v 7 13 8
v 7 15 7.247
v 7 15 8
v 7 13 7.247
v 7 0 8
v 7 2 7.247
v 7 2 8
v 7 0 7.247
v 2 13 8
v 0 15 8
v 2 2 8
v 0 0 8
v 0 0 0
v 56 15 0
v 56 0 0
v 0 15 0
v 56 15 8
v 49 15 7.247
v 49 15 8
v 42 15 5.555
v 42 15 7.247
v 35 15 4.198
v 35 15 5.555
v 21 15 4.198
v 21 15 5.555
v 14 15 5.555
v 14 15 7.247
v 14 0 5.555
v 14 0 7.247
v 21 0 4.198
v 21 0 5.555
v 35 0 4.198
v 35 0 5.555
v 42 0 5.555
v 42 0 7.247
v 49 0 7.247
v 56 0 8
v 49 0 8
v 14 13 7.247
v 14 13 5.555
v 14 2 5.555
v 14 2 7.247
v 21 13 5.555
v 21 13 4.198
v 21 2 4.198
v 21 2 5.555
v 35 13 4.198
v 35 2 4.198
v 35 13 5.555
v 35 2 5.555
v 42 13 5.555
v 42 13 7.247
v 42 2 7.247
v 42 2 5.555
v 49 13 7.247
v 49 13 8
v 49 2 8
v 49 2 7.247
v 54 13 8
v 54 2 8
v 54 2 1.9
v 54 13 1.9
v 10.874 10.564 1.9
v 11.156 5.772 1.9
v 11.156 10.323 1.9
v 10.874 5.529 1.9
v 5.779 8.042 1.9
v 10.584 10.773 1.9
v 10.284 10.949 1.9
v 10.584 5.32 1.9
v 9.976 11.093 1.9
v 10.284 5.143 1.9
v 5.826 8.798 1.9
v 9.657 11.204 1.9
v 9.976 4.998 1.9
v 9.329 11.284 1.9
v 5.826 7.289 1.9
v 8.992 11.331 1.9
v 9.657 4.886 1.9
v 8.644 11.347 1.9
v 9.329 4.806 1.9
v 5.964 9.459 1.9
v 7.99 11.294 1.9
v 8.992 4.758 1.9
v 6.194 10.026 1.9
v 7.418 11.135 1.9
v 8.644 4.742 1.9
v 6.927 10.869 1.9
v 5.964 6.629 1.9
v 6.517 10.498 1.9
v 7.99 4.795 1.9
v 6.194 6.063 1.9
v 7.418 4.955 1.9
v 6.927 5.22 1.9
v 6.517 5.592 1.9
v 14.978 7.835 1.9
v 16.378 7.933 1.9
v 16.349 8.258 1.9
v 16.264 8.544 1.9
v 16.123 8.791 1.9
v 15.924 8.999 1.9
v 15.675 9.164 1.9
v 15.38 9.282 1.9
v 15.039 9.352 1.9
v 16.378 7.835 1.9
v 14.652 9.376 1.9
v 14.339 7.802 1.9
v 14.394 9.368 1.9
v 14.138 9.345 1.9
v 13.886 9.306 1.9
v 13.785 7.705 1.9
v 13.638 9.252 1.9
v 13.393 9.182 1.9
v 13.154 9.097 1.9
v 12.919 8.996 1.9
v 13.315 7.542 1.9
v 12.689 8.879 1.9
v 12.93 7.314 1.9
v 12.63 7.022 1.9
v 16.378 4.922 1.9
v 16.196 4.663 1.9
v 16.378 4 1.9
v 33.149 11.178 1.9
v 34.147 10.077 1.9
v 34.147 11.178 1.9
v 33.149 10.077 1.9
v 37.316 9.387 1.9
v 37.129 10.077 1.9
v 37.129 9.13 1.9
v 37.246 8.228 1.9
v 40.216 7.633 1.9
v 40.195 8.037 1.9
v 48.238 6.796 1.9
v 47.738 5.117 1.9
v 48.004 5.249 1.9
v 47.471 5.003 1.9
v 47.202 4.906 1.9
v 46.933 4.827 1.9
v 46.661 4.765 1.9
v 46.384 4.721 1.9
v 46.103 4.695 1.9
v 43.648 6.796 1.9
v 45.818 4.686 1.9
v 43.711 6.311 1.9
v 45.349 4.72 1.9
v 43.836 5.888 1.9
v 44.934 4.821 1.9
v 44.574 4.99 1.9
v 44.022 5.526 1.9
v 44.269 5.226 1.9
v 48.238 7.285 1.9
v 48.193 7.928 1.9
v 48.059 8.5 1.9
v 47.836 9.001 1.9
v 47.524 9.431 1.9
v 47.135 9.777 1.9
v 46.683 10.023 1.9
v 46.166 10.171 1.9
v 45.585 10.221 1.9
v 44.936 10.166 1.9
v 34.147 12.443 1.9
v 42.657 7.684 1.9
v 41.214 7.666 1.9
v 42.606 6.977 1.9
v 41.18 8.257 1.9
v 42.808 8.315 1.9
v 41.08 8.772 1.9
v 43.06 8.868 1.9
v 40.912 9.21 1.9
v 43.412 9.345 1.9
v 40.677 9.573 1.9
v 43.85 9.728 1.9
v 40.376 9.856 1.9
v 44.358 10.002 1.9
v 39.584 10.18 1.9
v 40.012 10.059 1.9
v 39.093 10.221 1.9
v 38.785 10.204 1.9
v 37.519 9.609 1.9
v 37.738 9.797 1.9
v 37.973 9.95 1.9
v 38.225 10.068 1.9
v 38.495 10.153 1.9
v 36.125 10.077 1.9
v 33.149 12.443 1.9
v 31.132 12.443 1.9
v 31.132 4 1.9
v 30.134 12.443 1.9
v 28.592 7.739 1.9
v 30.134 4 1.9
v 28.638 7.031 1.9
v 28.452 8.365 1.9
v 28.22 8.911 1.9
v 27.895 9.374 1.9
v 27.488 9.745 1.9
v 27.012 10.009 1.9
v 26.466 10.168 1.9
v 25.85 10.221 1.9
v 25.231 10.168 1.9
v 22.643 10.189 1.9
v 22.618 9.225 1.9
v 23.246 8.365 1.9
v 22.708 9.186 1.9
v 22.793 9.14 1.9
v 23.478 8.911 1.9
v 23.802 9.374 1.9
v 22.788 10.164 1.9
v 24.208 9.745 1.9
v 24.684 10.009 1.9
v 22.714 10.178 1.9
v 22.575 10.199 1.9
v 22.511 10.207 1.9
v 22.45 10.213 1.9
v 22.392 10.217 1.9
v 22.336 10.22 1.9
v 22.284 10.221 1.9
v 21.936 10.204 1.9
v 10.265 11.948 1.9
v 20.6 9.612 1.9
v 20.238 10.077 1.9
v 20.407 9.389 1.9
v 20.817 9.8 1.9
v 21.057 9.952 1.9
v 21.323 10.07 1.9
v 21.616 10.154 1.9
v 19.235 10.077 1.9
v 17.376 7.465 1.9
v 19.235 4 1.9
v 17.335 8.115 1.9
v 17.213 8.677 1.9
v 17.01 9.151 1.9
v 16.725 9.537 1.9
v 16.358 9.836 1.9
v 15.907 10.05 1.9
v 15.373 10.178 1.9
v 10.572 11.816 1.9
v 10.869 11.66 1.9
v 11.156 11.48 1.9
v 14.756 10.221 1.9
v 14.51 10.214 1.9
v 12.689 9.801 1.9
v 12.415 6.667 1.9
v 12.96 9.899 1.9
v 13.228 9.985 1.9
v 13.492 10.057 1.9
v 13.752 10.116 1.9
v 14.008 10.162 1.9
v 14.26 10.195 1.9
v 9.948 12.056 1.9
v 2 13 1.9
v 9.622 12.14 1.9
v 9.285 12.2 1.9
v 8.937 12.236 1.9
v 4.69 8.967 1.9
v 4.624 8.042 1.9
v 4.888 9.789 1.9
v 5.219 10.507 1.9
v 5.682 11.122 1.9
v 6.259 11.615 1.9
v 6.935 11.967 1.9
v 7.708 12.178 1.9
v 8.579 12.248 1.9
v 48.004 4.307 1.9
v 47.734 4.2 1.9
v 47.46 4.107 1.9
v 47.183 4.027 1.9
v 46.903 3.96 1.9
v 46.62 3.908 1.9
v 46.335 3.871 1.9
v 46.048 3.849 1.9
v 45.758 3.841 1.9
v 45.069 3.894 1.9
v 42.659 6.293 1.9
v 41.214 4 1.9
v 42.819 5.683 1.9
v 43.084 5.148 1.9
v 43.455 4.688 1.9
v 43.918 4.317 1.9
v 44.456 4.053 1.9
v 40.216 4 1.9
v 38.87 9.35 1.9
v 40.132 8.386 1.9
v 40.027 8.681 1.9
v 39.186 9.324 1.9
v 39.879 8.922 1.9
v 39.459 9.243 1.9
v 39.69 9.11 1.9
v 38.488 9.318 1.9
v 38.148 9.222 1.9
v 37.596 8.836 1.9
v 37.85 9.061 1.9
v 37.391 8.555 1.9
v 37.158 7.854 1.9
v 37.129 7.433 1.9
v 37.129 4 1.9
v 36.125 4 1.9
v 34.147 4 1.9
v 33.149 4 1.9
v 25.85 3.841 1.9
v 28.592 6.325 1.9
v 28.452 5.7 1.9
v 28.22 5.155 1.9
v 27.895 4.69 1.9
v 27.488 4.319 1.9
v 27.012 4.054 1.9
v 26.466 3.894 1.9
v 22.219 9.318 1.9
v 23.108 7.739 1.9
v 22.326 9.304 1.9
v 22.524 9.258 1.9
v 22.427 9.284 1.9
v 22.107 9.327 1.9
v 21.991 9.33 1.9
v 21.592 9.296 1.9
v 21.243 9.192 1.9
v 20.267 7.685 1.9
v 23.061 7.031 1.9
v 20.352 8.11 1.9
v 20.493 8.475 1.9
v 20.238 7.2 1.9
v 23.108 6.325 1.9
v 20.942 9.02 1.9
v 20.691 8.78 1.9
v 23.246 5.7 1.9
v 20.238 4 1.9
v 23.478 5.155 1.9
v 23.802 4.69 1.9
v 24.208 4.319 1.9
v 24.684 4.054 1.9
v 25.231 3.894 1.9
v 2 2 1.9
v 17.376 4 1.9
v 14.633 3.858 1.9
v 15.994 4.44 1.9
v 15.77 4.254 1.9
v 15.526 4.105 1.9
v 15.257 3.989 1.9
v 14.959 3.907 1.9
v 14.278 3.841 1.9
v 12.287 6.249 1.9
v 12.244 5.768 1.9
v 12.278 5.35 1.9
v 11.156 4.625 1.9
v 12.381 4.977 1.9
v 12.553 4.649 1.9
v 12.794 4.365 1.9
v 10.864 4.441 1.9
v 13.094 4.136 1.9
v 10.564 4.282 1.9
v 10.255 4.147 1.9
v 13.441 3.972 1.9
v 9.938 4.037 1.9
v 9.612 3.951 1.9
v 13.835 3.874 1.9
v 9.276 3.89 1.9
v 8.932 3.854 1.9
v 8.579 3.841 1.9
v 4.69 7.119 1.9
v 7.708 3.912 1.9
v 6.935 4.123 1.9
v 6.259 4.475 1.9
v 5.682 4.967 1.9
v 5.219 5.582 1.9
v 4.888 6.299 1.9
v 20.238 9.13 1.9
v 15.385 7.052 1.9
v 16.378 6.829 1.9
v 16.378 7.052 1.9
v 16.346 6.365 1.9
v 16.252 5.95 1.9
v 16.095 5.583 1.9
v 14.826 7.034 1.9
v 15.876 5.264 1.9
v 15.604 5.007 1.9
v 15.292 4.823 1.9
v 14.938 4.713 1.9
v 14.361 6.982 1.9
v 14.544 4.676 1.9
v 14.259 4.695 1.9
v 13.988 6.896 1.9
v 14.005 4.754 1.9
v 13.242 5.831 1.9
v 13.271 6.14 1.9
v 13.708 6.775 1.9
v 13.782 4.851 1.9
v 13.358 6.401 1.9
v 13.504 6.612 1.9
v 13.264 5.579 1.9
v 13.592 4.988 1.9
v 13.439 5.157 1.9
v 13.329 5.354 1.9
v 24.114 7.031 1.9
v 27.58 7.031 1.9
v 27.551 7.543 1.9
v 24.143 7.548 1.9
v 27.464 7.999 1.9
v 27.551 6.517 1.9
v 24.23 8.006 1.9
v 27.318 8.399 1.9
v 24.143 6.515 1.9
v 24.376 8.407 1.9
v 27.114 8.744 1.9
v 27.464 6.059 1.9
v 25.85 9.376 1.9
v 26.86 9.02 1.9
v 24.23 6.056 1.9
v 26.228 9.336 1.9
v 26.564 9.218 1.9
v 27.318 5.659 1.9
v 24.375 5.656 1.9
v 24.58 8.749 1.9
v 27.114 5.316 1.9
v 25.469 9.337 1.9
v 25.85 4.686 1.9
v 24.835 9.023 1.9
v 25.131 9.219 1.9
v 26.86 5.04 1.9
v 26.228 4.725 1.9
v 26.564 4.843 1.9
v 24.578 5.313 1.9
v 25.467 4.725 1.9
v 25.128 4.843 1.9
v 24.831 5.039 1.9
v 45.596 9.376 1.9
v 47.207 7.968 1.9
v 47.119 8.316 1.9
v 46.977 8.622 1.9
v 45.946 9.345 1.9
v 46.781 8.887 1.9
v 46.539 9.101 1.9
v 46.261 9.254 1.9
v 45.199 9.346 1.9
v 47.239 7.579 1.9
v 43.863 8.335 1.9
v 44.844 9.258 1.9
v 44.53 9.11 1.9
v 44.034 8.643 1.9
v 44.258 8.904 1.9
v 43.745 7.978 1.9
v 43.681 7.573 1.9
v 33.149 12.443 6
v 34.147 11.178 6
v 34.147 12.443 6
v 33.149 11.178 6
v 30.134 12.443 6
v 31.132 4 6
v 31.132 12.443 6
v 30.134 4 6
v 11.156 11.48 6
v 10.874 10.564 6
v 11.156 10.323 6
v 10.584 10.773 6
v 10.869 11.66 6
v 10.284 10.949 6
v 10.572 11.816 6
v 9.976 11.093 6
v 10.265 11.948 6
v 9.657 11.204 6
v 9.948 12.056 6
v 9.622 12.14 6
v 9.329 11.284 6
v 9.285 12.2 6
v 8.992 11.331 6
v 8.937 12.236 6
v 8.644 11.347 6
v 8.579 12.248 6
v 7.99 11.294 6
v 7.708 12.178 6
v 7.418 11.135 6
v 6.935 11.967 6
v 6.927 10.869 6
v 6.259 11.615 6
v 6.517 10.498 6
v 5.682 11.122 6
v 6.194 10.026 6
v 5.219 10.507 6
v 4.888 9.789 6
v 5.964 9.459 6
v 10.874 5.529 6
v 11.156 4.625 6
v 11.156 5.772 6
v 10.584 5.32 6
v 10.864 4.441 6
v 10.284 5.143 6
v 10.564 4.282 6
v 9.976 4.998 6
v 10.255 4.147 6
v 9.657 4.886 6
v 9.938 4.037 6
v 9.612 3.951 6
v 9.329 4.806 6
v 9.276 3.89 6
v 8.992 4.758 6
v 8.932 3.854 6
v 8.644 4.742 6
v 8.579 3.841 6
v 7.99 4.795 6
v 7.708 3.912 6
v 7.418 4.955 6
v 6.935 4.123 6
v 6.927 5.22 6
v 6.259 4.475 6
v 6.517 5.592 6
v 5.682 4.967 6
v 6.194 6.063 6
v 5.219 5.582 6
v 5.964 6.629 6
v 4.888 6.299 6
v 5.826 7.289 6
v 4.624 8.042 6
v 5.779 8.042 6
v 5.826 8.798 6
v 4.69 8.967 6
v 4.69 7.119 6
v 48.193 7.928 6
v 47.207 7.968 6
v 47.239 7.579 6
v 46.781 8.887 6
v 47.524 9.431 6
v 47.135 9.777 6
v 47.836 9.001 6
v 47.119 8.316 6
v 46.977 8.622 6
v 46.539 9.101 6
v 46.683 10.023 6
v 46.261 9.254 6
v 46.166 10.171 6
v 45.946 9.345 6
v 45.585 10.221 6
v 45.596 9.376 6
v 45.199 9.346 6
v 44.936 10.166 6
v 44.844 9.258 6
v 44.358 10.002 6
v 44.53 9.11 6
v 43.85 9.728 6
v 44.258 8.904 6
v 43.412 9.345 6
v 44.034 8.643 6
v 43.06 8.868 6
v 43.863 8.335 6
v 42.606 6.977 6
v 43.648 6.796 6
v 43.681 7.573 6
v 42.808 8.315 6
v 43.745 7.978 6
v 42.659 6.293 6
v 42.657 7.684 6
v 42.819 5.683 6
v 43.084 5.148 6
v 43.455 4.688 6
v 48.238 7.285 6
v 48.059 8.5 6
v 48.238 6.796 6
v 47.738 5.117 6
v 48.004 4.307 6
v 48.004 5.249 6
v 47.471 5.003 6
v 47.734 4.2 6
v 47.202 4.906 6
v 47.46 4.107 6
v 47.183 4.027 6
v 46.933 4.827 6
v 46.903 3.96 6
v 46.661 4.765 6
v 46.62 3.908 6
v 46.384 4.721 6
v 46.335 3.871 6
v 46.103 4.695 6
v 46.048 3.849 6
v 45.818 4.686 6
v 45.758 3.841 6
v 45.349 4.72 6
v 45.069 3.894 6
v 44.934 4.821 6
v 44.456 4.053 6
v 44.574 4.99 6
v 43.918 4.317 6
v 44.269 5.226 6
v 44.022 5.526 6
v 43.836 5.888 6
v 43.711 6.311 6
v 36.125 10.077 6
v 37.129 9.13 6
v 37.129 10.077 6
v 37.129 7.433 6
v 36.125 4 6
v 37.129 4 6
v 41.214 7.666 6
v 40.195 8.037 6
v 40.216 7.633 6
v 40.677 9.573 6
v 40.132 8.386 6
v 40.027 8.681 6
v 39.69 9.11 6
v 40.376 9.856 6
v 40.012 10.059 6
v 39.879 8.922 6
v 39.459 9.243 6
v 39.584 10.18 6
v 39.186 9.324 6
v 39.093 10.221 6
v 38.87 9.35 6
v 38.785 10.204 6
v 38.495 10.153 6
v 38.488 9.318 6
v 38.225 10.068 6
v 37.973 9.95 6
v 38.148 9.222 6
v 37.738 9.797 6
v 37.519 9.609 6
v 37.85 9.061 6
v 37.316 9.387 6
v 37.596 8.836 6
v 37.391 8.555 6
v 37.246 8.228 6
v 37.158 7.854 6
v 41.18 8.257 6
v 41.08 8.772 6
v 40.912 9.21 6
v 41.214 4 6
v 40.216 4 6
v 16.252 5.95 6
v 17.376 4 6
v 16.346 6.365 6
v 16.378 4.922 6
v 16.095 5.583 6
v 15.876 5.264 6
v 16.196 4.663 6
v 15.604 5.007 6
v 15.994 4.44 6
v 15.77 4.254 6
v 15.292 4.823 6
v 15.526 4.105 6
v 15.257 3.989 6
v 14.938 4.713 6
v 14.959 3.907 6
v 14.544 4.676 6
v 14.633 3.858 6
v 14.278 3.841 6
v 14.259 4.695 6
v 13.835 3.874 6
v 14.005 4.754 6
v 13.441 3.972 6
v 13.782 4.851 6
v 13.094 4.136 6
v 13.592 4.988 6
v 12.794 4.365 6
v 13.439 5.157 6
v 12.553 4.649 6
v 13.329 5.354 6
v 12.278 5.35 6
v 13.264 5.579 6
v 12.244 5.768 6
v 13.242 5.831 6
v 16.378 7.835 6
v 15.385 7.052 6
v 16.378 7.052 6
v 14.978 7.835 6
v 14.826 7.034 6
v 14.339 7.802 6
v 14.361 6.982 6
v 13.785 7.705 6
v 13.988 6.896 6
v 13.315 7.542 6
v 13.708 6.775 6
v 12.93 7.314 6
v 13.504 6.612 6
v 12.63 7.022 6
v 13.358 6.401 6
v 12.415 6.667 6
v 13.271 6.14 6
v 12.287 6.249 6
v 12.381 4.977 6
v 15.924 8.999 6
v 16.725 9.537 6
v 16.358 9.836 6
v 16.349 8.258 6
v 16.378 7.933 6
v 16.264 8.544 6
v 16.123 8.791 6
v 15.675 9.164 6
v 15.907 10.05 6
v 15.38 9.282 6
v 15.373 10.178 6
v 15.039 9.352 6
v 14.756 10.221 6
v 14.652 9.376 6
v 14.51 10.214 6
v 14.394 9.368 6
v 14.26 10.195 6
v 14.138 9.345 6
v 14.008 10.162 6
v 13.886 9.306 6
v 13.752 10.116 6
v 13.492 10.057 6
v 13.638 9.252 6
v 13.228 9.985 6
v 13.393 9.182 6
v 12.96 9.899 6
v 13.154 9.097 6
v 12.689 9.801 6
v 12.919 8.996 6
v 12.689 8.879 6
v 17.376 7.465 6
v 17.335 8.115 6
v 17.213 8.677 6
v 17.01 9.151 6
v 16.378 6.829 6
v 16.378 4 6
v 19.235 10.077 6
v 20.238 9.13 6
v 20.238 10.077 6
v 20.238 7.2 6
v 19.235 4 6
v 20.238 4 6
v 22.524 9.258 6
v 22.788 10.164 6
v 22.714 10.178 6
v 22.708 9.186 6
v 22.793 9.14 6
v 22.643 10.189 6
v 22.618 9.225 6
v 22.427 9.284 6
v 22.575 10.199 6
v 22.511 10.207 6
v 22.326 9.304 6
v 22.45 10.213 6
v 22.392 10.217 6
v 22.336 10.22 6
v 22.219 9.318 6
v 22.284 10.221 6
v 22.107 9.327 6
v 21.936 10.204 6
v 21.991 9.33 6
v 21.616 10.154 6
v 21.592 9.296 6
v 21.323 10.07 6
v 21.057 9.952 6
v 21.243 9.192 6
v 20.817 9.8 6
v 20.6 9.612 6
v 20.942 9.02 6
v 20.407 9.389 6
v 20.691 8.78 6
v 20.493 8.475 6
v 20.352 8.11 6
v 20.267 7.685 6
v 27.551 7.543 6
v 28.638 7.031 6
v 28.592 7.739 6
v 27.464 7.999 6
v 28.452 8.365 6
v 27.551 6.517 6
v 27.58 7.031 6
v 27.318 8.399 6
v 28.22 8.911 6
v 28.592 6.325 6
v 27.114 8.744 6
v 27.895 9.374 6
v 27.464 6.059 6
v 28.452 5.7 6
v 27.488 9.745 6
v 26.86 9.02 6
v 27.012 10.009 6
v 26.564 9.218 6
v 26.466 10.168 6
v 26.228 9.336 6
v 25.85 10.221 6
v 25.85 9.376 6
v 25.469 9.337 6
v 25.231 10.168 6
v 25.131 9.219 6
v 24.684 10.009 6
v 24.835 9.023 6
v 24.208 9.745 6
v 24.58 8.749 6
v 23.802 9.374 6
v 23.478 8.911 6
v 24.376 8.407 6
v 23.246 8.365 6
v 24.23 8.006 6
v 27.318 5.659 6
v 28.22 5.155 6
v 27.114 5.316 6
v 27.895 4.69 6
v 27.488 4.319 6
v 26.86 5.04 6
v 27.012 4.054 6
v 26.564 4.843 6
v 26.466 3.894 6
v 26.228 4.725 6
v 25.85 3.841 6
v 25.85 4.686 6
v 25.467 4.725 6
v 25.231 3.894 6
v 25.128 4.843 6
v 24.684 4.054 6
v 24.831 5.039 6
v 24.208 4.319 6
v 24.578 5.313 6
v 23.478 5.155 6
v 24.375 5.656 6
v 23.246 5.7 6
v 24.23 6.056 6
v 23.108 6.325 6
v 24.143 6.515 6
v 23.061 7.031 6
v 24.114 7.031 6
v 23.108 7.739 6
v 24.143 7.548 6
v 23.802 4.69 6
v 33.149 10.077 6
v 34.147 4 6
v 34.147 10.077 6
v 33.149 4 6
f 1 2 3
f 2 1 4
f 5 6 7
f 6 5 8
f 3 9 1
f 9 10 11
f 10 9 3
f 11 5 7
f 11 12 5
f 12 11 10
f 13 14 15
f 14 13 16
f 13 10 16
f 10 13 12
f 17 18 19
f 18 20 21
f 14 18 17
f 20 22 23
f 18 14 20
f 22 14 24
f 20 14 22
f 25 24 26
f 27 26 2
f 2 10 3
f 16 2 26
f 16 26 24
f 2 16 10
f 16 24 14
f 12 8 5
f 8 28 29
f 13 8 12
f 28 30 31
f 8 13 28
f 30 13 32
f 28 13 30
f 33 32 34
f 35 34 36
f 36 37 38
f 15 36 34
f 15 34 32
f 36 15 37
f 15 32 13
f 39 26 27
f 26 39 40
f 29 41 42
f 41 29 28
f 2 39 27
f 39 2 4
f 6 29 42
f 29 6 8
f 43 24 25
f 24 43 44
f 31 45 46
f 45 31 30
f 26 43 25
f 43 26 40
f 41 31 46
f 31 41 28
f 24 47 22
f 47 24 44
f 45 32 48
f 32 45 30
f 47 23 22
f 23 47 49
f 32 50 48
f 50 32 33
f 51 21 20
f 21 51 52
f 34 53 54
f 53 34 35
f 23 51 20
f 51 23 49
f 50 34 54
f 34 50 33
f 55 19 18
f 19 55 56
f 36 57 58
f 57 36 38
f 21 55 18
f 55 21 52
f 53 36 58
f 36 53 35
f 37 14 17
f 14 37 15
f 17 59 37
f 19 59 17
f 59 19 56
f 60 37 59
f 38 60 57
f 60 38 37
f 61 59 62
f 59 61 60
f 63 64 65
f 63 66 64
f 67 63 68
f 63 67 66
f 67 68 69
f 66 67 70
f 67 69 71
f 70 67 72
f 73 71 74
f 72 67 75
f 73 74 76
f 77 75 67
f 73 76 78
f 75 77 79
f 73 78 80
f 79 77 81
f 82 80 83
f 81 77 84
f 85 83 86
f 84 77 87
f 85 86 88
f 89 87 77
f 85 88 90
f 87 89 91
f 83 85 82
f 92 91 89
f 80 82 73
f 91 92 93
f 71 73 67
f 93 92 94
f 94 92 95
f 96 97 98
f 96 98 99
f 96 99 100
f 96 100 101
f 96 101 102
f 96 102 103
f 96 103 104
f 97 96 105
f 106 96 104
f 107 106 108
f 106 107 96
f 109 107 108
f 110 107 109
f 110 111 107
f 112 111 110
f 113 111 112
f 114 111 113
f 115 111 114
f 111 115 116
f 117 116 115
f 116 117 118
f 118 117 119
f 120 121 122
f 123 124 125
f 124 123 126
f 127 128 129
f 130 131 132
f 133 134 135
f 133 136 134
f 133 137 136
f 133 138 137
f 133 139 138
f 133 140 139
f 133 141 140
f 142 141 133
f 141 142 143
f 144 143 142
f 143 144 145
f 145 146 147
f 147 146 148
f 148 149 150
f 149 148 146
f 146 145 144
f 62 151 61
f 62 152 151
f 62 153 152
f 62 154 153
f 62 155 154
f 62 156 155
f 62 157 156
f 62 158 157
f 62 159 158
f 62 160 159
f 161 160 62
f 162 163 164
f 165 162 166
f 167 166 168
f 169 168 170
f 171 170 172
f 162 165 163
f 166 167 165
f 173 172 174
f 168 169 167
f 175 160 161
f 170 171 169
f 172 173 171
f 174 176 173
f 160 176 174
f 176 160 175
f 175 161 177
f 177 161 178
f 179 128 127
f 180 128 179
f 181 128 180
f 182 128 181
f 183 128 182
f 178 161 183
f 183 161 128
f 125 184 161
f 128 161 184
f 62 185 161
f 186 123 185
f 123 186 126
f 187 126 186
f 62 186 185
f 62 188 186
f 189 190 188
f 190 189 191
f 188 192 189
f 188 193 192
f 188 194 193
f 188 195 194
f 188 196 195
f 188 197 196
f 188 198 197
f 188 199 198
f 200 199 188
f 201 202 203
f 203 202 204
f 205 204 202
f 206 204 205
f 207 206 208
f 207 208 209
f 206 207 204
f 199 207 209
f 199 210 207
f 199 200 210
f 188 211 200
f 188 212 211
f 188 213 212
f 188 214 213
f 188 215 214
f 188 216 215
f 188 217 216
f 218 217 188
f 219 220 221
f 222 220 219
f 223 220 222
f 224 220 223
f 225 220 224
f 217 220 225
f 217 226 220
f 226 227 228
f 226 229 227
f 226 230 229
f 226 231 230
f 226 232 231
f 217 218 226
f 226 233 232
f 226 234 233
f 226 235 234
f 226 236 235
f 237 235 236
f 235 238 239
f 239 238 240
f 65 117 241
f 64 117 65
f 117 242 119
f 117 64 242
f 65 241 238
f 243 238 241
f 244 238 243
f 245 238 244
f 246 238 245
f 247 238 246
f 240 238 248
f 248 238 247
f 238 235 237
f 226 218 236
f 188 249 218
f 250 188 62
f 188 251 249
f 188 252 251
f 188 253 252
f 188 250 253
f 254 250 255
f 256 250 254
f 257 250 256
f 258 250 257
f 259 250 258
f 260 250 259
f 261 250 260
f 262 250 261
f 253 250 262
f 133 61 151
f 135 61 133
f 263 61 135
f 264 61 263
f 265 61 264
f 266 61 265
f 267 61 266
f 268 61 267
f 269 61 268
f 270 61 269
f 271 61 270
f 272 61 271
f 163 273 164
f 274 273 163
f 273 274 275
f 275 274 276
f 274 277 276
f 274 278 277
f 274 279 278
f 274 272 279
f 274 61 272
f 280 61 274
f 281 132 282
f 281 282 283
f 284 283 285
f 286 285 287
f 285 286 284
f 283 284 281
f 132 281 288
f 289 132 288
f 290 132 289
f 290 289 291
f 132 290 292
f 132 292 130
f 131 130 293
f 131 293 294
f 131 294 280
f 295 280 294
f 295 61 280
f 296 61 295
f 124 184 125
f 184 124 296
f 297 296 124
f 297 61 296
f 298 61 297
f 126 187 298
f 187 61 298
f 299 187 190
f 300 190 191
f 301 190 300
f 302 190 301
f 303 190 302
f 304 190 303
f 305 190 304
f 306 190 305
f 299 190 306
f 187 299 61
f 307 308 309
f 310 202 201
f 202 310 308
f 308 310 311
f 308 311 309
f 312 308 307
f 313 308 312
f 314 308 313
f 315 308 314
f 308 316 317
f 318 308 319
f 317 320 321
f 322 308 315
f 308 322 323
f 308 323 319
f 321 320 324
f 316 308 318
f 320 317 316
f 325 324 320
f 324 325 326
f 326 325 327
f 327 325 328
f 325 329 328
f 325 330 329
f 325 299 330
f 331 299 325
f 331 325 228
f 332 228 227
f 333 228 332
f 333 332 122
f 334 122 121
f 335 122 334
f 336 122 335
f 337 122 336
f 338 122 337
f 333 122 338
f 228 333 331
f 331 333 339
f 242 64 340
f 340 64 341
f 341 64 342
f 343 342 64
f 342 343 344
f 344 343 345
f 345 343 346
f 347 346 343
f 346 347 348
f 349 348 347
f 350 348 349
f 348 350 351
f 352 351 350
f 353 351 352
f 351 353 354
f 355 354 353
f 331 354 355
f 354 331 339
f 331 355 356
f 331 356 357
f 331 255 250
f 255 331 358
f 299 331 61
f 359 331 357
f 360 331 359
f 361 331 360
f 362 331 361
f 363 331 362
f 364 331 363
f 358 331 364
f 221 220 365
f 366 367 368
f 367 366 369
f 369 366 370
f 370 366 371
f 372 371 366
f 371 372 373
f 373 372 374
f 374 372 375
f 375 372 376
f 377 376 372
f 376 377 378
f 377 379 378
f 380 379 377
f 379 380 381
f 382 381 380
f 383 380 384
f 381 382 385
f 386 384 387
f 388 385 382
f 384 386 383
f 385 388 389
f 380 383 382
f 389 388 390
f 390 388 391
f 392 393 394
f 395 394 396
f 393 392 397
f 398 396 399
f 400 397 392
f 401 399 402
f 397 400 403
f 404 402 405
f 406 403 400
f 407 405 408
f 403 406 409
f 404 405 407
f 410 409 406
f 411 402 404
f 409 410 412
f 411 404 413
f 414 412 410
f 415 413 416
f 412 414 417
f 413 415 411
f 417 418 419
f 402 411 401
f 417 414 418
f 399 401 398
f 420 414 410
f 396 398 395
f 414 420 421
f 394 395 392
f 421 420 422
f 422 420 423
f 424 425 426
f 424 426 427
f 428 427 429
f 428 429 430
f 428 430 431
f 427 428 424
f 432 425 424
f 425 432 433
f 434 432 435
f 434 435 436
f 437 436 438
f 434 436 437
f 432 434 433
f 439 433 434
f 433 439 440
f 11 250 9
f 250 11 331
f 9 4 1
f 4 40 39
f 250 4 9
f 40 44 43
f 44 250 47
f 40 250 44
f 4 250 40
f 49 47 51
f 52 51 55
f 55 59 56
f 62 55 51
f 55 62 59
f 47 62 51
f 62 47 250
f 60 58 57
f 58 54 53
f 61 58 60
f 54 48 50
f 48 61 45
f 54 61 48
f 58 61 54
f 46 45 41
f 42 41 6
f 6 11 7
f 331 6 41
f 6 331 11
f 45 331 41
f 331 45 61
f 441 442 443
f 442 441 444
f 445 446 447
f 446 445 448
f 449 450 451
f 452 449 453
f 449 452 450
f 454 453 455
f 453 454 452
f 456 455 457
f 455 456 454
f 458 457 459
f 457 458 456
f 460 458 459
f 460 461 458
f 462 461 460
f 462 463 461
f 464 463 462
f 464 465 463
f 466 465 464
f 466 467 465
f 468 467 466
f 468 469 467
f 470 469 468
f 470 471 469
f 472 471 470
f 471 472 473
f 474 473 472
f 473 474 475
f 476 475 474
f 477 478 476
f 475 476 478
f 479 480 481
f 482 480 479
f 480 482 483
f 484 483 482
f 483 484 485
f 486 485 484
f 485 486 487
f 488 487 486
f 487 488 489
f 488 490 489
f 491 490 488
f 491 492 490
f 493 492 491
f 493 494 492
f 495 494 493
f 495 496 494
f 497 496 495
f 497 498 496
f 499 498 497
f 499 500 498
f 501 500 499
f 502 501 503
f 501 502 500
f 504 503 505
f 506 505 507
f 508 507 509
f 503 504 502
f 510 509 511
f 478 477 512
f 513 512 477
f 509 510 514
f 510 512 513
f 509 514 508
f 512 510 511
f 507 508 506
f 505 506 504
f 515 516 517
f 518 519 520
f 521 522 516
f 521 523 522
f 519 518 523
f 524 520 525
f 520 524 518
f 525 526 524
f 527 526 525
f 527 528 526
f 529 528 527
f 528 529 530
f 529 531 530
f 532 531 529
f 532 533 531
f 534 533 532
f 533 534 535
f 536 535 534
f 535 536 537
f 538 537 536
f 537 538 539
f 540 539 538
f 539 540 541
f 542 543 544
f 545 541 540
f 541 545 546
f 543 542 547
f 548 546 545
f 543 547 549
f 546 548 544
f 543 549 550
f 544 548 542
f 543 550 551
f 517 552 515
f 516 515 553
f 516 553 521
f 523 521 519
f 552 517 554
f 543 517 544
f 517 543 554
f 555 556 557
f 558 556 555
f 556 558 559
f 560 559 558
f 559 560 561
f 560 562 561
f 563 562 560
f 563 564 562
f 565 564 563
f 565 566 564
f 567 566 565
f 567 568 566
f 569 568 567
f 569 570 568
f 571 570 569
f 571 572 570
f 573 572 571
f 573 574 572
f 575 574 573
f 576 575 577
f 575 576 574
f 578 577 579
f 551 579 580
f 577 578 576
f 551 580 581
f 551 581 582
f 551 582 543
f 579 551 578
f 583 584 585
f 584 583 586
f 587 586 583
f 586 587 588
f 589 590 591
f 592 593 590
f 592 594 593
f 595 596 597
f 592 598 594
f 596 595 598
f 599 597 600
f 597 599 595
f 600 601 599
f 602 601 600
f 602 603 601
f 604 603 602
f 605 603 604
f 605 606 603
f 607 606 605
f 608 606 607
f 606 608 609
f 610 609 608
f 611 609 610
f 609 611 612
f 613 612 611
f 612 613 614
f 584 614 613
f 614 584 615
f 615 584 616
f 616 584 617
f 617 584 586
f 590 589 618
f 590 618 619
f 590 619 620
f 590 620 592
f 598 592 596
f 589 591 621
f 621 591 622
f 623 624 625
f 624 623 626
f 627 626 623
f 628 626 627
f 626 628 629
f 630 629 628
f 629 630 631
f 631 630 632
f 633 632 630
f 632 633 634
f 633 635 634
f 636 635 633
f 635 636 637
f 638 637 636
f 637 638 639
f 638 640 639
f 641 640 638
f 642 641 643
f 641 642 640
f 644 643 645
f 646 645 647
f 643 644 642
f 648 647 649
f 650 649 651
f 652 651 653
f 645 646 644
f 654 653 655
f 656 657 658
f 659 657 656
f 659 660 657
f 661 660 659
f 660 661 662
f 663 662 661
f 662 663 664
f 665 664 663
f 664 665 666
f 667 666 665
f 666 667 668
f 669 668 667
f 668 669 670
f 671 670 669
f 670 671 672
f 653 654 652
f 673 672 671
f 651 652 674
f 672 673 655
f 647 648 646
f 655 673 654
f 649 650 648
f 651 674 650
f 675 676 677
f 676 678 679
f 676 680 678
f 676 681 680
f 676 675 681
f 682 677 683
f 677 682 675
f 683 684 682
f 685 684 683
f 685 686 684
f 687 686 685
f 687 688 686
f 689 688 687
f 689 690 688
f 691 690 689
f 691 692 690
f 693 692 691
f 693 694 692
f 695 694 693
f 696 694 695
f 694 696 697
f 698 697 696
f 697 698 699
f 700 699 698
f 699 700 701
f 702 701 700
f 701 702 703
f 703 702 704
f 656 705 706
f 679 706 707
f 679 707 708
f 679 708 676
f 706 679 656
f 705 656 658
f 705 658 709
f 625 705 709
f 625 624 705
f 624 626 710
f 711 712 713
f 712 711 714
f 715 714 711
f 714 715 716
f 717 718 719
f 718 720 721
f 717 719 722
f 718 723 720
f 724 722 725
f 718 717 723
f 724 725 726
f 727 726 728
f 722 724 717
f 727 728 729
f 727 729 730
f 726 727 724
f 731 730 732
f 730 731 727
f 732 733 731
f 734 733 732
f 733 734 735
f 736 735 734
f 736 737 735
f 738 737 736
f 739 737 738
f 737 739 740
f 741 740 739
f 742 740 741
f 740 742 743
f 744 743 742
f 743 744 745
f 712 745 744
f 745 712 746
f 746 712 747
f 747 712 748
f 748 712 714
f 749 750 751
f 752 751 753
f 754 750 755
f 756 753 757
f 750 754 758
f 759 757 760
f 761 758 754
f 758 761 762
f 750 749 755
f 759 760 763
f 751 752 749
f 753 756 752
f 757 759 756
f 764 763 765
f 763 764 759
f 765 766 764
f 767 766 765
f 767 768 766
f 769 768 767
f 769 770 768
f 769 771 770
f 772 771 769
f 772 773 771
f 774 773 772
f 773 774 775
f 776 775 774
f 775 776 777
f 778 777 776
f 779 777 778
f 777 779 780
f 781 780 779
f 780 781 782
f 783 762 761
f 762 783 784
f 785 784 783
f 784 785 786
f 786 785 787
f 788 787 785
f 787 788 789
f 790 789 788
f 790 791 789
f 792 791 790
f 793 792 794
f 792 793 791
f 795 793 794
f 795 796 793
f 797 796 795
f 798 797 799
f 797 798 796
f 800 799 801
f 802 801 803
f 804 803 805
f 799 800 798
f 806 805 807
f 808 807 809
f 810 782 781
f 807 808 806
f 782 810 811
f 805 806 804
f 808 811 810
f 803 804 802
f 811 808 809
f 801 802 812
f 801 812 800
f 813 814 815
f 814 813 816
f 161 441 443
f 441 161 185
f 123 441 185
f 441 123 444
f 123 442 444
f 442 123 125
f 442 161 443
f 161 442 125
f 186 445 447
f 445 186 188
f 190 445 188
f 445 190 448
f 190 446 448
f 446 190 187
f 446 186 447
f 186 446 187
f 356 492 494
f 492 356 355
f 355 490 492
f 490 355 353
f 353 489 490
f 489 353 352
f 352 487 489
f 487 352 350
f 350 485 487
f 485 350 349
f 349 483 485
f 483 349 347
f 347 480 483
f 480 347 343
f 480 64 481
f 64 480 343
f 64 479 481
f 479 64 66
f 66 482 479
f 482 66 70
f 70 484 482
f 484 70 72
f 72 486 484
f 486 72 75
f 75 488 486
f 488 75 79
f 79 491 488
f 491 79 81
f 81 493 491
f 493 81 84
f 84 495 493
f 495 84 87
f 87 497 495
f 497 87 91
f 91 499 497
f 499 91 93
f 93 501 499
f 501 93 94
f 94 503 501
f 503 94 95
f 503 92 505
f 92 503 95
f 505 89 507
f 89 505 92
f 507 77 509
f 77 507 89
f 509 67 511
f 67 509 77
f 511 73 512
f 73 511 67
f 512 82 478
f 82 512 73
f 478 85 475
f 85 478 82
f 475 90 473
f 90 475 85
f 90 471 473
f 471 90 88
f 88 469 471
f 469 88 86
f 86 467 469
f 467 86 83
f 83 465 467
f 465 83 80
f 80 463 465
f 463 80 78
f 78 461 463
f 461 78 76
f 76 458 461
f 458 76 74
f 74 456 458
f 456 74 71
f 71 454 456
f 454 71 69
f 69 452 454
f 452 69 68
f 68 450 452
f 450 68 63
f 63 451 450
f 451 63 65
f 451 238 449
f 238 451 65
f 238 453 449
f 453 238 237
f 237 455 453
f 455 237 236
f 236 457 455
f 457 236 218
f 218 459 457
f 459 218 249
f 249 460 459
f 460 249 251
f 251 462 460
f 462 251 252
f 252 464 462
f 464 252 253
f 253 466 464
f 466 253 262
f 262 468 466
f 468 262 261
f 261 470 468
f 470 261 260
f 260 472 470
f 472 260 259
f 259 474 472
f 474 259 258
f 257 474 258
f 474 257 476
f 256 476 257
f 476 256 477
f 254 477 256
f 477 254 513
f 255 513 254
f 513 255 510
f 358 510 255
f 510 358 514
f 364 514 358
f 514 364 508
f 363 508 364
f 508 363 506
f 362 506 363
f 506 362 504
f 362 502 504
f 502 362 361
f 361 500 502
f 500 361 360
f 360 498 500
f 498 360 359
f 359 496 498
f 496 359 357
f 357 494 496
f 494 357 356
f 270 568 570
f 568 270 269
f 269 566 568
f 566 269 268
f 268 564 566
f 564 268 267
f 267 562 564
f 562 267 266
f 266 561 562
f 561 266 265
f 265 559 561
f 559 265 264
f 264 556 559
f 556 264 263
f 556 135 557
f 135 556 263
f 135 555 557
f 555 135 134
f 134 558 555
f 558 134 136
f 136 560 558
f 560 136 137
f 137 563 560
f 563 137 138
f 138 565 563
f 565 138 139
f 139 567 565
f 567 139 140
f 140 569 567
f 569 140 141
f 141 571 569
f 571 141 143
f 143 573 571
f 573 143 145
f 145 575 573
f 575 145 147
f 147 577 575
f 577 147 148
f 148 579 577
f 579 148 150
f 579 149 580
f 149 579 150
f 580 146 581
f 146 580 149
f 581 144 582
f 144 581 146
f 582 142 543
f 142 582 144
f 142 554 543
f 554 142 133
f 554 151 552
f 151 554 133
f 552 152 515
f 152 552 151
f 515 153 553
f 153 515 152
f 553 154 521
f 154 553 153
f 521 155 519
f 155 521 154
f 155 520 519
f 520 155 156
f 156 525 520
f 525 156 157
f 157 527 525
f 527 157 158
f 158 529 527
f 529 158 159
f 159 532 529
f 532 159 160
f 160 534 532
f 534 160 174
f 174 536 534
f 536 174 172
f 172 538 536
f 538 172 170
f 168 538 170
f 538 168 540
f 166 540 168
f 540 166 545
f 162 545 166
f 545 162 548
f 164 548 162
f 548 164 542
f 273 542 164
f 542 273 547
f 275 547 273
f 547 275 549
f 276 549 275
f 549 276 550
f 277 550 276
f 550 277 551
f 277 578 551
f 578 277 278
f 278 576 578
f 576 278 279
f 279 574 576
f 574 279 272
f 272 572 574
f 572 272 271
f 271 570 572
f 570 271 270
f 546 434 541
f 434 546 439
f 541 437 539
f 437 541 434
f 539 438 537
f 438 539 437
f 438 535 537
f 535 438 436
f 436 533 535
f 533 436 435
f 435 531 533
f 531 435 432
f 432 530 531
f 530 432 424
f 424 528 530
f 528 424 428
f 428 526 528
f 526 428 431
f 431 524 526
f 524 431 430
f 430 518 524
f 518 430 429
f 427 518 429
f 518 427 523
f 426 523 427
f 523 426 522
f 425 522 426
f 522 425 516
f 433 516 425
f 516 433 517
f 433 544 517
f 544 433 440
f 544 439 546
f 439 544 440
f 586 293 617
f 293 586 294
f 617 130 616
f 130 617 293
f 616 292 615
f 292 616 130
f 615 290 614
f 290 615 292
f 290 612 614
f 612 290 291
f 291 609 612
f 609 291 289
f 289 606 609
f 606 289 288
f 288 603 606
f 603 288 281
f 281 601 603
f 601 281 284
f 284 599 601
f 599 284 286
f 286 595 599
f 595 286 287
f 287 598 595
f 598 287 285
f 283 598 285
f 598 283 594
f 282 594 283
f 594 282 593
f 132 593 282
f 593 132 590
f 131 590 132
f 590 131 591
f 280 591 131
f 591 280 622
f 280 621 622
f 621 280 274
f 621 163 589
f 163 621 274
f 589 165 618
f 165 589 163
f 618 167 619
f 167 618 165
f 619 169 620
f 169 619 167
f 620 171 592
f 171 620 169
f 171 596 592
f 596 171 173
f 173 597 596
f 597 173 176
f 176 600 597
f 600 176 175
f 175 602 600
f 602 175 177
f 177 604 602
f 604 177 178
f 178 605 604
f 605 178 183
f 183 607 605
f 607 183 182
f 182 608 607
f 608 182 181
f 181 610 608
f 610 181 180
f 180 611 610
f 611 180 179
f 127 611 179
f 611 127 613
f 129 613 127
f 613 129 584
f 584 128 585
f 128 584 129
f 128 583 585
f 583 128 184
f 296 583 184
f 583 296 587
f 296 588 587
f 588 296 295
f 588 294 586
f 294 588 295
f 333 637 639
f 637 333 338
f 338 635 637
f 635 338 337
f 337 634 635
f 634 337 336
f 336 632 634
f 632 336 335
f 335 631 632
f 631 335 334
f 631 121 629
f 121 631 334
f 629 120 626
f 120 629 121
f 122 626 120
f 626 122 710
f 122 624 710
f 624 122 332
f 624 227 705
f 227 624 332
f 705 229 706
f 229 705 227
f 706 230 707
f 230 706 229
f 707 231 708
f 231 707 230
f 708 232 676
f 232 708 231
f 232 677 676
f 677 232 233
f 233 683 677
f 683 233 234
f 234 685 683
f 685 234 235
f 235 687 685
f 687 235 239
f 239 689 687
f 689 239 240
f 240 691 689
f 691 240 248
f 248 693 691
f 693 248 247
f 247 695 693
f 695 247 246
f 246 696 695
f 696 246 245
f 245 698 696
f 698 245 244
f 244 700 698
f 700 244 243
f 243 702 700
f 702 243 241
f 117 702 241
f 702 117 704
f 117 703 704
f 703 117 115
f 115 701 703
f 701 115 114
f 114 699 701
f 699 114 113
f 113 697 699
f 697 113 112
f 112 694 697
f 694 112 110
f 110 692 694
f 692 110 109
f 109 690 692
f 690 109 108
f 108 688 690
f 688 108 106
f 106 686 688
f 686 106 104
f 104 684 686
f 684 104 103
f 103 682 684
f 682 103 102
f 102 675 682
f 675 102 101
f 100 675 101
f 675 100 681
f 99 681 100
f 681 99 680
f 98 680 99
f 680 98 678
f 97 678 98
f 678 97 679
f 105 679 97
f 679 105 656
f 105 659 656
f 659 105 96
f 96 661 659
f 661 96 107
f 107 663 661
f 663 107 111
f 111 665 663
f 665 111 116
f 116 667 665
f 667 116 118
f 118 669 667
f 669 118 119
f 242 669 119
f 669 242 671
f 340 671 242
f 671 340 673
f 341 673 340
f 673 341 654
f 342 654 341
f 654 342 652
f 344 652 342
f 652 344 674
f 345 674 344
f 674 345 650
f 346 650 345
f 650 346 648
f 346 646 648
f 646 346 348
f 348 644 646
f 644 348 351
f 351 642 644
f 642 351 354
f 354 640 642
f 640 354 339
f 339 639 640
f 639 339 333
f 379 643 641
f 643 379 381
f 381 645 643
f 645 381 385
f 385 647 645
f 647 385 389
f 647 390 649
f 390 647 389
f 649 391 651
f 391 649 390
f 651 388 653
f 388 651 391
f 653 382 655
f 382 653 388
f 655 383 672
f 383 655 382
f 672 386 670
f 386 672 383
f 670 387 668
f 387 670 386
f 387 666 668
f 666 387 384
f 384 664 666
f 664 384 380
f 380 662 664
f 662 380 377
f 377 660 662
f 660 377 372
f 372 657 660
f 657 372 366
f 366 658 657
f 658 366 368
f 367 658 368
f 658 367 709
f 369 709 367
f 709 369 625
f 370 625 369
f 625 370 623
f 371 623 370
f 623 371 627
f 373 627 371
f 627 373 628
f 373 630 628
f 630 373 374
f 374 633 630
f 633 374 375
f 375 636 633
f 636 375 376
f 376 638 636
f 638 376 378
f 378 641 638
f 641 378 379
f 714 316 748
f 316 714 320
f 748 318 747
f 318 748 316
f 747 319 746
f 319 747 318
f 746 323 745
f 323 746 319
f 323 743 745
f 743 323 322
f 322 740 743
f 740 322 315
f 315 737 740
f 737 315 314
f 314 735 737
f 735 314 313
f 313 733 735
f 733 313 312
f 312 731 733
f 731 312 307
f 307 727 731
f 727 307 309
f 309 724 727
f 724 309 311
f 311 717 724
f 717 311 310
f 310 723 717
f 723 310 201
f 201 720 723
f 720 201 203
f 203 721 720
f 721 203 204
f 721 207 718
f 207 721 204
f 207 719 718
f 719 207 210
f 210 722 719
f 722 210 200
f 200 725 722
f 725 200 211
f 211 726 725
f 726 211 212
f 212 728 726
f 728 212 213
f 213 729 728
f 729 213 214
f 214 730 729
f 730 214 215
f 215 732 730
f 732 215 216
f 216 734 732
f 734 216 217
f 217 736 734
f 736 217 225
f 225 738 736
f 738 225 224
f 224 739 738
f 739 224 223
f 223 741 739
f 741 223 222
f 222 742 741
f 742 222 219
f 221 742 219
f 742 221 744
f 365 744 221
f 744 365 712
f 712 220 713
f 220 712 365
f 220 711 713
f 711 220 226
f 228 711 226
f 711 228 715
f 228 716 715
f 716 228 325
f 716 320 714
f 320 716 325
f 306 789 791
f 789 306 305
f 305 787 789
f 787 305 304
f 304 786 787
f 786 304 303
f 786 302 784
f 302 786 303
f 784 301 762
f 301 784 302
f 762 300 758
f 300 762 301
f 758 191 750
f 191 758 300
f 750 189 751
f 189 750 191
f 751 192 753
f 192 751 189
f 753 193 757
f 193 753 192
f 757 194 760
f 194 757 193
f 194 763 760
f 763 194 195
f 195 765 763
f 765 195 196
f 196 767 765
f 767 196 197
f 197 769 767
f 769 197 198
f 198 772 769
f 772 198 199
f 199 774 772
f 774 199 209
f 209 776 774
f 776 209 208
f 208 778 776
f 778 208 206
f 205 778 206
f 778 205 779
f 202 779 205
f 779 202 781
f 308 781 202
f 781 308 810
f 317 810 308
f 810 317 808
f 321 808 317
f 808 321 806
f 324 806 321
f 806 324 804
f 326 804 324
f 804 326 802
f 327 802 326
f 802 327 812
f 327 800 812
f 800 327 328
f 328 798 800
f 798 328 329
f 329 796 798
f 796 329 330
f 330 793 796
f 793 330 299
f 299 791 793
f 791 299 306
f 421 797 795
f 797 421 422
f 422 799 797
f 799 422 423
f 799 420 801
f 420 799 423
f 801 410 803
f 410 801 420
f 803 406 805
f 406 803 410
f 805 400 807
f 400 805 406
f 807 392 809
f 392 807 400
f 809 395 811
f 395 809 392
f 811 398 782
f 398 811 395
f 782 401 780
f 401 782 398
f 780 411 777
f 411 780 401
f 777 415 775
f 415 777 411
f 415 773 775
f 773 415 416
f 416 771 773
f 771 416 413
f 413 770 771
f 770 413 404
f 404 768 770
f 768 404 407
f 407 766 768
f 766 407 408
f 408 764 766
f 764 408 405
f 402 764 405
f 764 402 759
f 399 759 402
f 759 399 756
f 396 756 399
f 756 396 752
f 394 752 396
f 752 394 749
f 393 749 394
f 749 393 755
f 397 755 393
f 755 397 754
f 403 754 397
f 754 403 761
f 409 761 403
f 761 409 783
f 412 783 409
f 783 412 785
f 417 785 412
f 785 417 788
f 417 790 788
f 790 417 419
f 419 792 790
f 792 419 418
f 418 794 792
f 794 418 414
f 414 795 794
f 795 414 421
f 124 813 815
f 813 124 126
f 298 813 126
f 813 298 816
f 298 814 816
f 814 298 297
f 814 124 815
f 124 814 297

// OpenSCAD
// MakerBot Handbook Tutorial
// OpenSCAD nametag with parameters

// Start by modifying the parameters at the beginning of this document.

// The code is very simple and we've included lots of comments.
// Even if you've never read or written code before, you can do this!

// For more advanced exploration, you can experiment with the 
// trigonometric function and the rest of the code below the parameters. 

/////////////////////////////////////////////////////////////////////
// THE PARAMETERS

// TEXT AND FONT
// Use menu Help / Font List to find the available font names
// You can drag and drop names right from the OpenSCAD Font List
// fontsize controls the letter heights

myword = "Caroline";
myfont="Phosphate:style=Inline";
fontsize = 8;

// TOTAL DIMENSIONS
// Adjust these dimensions to fit the size of your word.
// The "length" is left to right, the "width" is top to bottom.
// The "height" will be the height of the top of the tallest wave.

length = 56; 
width = 15;
height = 8;

// BORDER CURVE STYLE
// Now you can style the border of your nametag!
// The "frequency" controls the number of waves.
// A low number of steps is good for a cool chunky look.
// A large number of steps is smoother, but takes longer to compile.
// You probably won't want to change border, inset, or base.

frequency = 1;
steps = 8;
border = 2;
inset = 2;
base = 2;

/////////////////////////////////////////////////////////////////////
// PRINT THE TEXT

// STEP 3. Translate up and to the right past the border.

translate([ border + inset, border + inset, 0 ]){

    // STEP 2. Pull up the text in the z-direction.
    
    linear_extrude( height = 6 ){
    
        // STEP 1. Write the word in the correct font and size.
        
        text(
            text = myword, 
            font = myfont, 
            size = fontsize, 
            spacing = 1
        );
        
    // This closes the parenthesis for "linear_extrude".
    }

// This closes the parenthesis for "translate".  
}

/////////////////////////////////////////////////////////////////////
// THIS TRIGONOMETRIC FUNCTION CONTROLS THE WAVE
// (don't mess with this unless you are a trigonometry master :)

// The first part ensures that the lowest part is above the base.
// The middle part scales the function to a max height of "height".
// The last line is a shifted trig function with variable frequency.
// The "steps-1" allows one extra step contained in the "width".

function f(x) = 
    2*base + 
    0.5*(height - 2*base)*
    ( cos(frequency*x*360/(steps-1)) + 1 );
    
/////////////////////////////////////////////////////////////////////
// MAKE A WAVY SHAPE AND CUT OUT THE INSIDE

// The "difference" command subtracts the second thing from the first.
// We're going to construct a wavy shape and subtract an interior box.

difference(){
    
    // STEP 1: Make a wavy shape out of a series of retangular boxes.
    
    // Make a rectangular box for each number i = 0, 1, ..., steps-1.
    // To get a better idea of what each step is doing,
    // try replacing "steps-1" with something small like "4" or "8".
    // Then make sure it says "[0:steps-1]" again when you're done!
    
    for( i = [0:steps-1] ){
        
        // Move box "i" to the right by "i*(length/steps)" units,
        // so that box "i" begins right where box "i-1" ends.
        // Note that the width of each box is "length/steps".
        
        translate([ i*(length/steps), 0, 0 ])
            
            // This is box "i", a thin rectangular solid.
            // The box height is determined by the function "f".
            // Put a "#" before "cube" to see the full rectangles,
            // and remove it when you're done.
        
            cube([ length/steps, width, f(i) ]);
        
    // This closes the parentheses of the "for" loop.
    }
    
    // STEP 2: Remove a box on the inside to make room for the text.

    // Translate the box past the left and lower borders, and
    // translate it up to just a tiny bit below the top of the base.
    
    translate([ border, border, base-.1 ])
    
        // This is the cube that is to be removed.
        // The length and width take into account the border size.
        // Put a "#" before "cube" to see the box, 
        // and remove it when you're done.
    
        cube([
            length - 2*border,
            width - 2*border,
            height
        ]);
    
 // This closes the parentheses for "difference".
 }

 
 
 
 
 
 
